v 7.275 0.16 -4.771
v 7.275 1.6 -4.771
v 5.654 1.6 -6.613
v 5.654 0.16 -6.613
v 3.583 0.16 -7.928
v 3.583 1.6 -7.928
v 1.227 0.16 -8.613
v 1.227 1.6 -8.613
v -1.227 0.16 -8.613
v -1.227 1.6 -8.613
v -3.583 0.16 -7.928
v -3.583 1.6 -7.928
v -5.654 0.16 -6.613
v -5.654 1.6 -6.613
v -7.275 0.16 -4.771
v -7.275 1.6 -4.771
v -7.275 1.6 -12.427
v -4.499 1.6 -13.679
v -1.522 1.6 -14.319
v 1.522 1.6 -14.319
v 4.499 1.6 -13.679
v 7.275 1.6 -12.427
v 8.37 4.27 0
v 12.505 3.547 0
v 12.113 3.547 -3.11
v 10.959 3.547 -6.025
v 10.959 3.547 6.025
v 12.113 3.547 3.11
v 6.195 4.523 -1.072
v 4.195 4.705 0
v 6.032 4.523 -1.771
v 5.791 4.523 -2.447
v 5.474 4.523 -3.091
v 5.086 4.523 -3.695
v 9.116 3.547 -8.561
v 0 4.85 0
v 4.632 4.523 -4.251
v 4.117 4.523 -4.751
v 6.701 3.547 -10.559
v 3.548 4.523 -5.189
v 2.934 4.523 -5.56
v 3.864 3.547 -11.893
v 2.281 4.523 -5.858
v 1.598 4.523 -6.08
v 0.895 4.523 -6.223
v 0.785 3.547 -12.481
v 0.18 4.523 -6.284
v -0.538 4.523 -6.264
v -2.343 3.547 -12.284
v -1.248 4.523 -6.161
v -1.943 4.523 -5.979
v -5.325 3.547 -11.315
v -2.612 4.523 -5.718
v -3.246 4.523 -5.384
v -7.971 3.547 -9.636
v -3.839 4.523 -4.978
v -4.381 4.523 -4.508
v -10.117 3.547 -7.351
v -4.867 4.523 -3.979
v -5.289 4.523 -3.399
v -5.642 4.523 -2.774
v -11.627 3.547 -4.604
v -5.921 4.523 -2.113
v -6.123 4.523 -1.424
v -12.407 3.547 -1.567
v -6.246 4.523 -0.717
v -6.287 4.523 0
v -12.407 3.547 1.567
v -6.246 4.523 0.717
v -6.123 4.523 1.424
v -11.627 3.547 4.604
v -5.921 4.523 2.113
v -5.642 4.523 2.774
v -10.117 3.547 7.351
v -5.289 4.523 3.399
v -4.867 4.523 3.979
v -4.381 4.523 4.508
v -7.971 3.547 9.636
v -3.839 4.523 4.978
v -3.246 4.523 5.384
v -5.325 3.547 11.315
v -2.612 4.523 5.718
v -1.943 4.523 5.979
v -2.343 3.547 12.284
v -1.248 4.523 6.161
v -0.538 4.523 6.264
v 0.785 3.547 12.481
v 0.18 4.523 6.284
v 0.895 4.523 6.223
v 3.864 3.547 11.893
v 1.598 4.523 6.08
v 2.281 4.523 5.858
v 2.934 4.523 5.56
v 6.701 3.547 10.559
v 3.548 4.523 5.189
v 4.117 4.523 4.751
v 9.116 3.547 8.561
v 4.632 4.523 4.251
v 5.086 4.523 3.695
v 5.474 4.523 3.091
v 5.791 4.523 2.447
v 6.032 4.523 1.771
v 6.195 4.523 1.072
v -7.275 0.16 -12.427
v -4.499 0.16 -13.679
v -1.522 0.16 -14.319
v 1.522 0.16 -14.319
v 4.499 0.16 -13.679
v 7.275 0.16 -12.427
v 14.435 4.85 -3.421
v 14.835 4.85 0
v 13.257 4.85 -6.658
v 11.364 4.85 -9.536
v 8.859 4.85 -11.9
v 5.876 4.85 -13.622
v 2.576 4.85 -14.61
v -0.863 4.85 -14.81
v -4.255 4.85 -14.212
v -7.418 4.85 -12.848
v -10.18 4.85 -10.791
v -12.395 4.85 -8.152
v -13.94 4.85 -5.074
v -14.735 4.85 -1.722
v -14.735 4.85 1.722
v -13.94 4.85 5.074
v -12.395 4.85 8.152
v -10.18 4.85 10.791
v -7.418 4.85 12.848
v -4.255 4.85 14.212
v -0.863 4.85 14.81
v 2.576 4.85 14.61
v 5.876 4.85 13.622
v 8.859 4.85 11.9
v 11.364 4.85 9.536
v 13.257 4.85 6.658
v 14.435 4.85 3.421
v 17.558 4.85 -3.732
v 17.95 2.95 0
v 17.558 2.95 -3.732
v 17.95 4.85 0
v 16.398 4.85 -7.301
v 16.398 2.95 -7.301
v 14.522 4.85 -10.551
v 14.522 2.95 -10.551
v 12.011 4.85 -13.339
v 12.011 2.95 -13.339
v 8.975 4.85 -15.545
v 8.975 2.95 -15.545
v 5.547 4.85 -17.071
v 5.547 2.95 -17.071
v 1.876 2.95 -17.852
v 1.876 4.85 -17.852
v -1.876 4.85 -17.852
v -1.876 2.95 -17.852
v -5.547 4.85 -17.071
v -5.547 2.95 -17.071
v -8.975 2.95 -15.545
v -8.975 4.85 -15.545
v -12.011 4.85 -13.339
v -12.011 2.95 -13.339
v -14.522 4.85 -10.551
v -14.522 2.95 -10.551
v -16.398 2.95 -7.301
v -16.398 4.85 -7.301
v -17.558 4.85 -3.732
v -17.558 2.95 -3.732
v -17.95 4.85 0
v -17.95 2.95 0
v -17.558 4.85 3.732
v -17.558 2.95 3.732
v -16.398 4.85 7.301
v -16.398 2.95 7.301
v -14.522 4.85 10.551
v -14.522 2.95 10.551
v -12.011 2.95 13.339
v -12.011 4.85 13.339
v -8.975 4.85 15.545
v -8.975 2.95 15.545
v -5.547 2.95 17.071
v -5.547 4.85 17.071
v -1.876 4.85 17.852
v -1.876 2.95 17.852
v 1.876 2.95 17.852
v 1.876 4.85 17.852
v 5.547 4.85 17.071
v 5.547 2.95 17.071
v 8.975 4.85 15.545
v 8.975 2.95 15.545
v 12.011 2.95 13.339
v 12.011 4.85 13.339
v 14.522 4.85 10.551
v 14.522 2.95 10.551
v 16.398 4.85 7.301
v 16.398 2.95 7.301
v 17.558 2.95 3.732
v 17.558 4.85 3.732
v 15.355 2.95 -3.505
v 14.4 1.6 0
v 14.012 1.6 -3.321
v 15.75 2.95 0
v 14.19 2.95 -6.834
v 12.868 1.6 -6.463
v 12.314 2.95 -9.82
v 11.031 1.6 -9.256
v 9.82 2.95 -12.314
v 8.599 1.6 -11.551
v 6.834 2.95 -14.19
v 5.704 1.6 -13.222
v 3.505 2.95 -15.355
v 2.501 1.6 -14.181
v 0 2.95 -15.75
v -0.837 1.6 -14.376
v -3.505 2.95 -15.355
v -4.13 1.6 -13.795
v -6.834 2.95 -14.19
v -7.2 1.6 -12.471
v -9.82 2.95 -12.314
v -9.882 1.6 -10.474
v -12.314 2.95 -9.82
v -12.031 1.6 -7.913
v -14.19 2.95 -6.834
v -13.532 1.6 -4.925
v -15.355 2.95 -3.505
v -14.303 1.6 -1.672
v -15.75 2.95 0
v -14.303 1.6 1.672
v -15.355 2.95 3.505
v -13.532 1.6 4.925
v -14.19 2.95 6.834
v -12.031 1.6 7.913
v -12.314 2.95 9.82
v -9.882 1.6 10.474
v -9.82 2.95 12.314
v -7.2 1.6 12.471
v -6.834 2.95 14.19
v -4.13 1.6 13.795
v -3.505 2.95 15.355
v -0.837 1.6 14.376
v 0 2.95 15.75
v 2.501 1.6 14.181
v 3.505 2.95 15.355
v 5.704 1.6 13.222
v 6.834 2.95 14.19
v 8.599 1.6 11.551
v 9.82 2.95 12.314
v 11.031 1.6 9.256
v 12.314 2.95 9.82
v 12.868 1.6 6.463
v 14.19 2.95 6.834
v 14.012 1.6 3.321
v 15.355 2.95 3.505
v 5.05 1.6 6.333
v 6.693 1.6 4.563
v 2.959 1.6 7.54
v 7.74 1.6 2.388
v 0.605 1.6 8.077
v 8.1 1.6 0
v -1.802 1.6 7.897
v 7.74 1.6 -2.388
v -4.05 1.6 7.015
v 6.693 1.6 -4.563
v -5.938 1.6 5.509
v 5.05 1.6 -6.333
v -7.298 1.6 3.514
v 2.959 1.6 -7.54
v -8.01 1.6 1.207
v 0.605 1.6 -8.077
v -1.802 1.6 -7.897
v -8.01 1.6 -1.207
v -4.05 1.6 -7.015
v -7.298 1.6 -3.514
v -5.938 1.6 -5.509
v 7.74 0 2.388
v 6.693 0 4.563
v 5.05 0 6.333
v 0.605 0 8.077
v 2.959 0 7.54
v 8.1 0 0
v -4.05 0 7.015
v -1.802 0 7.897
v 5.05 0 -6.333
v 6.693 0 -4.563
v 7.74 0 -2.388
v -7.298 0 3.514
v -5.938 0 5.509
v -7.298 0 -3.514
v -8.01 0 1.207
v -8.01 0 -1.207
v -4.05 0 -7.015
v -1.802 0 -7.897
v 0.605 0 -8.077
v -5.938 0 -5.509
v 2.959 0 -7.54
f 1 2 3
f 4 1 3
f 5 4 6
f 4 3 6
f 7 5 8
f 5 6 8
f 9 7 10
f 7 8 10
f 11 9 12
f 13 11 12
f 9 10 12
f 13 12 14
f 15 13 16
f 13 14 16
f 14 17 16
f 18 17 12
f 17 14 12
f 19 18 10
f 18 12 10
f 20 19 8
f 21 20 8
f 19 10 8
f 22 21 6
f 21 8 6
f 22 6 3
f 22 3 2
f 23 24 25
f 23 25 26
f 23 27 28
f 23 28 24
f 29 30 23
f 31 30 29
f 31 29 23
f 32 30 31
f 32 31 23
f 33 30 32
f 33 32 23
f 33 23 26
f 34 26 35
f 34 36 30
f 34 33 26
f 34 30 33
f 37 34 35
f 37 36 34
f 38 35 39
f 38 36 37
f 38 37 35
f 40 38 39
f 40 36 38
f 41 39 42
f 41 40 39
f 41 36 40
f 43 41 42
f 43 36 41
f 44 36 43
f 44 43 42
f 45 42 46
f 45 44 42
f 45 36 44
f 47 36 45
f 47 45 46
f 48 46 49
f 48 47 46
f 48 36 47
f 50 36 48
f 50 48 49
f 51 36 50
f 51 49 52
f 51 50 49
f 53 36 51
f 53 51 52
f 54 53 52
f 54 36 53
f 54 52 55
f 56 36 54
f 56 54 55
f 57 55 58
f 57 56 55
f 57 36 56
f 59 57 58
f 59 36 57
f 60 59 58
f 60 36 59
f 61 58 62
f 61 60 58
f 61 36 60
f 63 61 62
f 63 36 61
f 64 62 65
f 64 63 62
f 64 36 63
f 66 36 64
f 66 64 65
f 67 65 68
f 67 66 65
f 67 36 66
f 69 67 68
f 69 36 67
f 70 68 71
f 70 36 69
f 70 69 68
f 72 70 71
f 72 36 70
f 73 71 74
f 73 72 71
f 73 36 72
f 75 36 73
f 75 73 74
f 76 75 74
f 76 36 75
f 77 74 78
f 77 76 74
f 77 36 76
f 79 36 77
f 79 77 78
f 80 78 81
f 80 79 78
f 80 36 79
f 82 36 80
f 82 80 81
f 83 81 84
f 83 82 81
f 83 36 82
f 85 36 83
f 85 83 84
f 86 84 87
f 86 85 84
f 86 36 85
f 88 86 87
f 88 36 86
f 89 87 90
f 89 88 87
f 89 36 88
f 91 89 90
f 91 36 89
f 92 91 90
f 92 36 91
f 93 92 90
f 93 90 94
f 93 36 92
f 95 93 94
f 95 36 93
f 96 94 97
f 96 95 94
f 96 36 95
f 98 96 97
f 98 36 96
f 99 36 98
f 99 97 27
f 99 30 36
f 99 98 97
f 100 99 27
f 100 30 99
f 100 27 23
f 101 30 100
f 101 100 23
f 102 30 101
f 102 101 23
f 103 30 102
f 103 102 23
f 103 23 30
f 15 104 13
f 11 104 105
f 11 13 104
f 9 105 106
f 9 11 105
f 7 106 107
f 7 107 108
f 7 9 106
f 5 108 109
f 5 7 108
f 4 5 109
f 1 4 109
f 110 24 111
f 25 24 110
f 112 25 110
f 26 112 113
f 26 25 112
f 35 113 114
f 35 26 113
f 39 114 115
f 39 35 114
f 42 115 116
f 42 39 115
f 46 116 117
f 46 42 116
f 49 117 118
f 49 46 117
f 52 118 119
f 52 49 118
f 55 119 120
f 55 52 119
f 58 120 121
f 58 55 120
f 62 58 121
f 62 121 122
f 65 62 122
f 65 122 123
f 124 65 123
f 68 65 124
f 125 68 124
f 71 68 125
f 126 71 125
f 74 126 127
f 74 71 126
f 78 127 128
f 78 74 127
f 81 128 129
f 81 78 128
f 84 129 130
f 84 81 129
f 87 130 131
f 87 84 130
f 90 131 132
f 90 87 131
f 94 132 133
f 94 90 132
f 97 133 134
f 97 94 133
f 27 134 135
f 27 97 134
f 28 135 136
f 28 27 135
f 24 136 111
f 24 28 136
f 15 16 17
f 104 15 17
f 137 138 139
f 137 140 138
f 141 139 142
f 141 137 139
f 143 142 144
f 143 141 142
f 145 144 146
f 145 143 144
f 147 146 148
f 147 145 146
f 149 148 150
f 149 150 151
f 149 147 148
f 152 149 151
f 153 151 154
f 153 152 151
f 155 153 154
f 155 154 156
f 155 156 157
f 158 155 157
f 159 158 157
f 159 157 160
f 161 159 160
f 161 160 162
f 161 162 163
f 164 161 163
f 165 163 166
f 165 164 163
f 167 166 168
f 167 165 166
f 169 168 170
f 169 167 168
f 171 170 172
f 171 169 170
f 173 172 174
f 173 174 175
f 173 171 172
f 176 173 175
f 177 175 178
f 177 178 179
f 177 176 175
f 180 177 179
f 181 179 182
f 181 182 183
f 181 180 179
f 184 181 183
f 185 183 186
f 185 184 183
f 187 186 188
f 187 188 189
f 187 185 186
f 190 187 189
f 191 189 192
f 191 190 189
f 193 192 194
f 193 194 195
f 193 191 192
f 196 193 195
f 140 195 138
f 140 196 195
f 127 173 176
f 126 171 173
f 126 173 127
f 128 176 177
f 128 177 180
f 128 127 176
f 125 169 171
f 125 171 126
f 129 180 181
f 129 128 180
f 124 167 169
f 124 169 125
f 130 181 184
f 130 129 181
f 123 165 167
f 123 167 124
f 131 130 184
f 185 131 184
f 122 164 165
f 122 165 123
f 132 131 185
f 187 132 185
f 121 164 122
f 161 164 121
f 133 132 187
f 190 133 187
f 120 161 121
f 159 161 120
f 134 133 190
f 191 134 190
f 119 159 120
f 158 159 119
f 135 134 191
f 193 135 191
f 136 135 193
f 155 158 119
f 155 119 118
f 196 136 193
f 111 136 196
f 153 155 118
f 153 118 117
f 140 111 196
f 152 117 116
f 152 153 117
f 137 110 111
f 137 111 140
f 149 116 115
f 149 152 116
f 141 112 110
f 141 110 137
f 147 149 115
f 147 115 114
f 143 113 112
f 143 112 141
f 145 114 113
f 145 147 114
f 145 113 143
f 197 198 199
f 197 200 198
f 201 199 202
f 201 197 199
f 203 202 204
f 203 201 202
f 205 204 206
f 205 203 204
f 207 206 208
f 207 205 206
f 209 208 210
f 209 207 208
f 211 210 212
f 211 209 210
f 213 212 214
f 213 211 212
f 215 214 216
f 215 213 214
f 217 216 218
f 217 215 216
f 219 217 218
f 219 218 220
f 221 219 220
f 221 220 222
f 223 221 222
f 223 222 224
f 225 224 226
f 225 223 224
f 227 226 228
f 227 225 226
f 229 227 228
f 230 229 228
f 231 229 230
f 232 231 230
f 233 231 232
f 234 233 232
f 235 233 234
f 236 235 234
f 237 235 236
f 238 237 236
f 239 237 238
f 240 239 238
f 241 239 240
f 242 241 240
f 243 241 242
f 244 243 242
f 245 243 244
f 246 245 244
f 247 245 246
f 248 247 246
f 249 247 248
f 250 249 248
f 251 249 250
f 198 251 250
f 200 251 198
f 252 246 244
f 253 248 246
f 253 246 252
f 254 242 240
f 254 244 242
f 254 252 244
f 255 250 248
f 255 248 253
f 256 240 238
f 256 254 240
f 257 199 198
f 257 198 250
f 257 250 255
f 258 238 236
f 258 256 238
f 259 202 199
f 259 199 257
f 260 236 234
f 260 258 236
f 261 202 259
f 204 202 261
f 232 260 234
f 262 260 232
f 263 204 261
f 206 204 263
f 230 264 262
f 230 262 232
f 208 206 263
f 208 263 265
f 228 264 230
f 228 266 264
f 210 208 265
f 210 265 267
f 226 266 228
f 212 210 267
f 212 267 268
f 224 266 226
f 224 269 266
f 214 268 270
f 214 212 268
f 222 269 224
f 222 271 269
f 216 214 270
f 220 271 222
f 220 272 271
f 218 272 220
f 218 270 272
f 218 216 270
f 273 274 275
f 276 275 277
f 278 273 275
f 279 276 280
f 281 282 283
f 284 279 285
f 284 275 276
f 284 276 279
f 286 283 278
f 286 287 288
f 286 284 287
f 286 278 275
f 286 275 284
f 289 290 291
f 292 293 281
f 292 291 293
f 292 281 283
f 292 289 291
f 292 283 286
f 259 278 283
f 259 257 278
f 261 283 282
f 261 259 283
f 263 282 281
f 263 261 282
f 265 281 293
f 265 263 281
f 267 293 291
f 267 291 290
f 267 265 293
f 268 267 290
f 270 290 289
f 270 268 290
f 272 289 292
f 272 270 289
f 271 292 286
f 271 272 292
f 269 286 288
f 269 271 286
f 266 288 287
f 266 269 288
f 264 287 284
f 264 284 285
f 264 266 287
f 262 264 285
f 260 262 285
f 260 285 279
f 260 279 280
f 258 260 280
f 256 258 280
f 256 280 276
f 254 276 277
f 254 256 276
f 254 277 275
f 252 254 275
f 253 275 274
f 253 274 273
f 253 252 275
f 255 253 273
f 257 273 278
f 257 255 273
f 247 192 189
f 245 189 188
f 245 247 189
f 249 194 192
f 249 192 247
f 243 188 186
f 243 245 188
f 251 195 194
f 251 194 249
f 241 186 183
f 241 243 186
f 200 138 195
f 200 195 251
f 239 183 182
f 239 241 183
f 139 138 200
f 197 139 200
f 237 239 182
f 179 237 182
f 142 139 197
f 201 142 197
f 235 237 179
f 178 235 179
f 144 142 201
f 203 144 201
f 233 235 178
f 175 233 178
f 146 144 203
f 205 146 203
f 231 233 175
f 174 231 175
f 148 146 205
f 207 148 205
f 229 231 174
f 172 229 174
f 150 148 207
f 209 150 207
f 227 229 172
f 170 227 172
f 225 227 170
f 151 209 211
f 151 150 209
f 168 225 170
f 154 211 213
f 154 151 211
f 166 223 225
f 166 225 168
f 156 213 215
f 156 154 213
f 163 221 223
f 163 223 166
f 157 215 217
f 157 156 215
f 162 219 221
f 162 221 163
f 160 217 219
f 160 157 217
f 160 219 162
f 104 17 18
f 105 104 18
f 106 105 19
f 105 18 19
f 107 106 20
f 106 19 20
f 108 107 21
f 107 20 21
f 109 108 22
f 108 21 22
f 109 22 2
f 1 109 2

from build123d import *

# Parameters (mm, degrees)
BOSS_EXTRUDE1_DEPTH = 1.44


with BuildPart() as part:
    # Sketch1 → Revolve1 (revolve)
    with BuildSketch(Plane.XY, mode=Mode.PRIVATE) as revolve1_sk:
        with BuildLine():
            Line((0, 0), (-8.1, 0))
            Line((-8.1, 0), (-8.1, 1.6))
            Line((-8.1, 1.6), (-14.4, 1.6))
            Line((-14.4, 1.6), (-15.75, 2.95))
            Line((-15.75, 2.95), (-17.95, 2.95))
            Line((-17.95, 2.95), (-17.95, 4.85))
            Line((-17.95, 4.85), (-14.835133301, 4.85))
            Line((-14.835133301, 4.85), (-12.505491074, 3.546870113))
            ThreePointArc((-12.505491074, 3.546870113), (-6.286601914, 4.523337912), (0, 4.85))
            Line((0, 4.85), (0, 0))
        make_face()
    revolve(revolve1_sk.sketch.rotate(Axis((0, 0, 0), (0, 1, 0)), 180), axis=Axis((0, 0, 0), (0, 1, 0)))  # turned: the seam where the file's is


with BuildPart() as body_2:
    # Sketch2 → Boss-Extrude1 (new body)
    with BuildSketch(Plane.XZ.offset(-1.6)):
        with BuildLine():
            Line((-7.275, -4.771202679), (-7.275, -12.42716279))
            ThreePointArc((-7.275, -12.42716279), (0, -14.4), (7.275, -12.42716279))
            Line((7.275, -12.42716279), (7.275, -4.771202679))
            ThreePointArc((7.275, -4.771202679), (0, -8.7), (-7.275, -4.771202679))
        make_face()
    extrude(amount=BOSS_EXTRUDE1_DEPTH)


solid = Compound([part.part, body_2.part])
